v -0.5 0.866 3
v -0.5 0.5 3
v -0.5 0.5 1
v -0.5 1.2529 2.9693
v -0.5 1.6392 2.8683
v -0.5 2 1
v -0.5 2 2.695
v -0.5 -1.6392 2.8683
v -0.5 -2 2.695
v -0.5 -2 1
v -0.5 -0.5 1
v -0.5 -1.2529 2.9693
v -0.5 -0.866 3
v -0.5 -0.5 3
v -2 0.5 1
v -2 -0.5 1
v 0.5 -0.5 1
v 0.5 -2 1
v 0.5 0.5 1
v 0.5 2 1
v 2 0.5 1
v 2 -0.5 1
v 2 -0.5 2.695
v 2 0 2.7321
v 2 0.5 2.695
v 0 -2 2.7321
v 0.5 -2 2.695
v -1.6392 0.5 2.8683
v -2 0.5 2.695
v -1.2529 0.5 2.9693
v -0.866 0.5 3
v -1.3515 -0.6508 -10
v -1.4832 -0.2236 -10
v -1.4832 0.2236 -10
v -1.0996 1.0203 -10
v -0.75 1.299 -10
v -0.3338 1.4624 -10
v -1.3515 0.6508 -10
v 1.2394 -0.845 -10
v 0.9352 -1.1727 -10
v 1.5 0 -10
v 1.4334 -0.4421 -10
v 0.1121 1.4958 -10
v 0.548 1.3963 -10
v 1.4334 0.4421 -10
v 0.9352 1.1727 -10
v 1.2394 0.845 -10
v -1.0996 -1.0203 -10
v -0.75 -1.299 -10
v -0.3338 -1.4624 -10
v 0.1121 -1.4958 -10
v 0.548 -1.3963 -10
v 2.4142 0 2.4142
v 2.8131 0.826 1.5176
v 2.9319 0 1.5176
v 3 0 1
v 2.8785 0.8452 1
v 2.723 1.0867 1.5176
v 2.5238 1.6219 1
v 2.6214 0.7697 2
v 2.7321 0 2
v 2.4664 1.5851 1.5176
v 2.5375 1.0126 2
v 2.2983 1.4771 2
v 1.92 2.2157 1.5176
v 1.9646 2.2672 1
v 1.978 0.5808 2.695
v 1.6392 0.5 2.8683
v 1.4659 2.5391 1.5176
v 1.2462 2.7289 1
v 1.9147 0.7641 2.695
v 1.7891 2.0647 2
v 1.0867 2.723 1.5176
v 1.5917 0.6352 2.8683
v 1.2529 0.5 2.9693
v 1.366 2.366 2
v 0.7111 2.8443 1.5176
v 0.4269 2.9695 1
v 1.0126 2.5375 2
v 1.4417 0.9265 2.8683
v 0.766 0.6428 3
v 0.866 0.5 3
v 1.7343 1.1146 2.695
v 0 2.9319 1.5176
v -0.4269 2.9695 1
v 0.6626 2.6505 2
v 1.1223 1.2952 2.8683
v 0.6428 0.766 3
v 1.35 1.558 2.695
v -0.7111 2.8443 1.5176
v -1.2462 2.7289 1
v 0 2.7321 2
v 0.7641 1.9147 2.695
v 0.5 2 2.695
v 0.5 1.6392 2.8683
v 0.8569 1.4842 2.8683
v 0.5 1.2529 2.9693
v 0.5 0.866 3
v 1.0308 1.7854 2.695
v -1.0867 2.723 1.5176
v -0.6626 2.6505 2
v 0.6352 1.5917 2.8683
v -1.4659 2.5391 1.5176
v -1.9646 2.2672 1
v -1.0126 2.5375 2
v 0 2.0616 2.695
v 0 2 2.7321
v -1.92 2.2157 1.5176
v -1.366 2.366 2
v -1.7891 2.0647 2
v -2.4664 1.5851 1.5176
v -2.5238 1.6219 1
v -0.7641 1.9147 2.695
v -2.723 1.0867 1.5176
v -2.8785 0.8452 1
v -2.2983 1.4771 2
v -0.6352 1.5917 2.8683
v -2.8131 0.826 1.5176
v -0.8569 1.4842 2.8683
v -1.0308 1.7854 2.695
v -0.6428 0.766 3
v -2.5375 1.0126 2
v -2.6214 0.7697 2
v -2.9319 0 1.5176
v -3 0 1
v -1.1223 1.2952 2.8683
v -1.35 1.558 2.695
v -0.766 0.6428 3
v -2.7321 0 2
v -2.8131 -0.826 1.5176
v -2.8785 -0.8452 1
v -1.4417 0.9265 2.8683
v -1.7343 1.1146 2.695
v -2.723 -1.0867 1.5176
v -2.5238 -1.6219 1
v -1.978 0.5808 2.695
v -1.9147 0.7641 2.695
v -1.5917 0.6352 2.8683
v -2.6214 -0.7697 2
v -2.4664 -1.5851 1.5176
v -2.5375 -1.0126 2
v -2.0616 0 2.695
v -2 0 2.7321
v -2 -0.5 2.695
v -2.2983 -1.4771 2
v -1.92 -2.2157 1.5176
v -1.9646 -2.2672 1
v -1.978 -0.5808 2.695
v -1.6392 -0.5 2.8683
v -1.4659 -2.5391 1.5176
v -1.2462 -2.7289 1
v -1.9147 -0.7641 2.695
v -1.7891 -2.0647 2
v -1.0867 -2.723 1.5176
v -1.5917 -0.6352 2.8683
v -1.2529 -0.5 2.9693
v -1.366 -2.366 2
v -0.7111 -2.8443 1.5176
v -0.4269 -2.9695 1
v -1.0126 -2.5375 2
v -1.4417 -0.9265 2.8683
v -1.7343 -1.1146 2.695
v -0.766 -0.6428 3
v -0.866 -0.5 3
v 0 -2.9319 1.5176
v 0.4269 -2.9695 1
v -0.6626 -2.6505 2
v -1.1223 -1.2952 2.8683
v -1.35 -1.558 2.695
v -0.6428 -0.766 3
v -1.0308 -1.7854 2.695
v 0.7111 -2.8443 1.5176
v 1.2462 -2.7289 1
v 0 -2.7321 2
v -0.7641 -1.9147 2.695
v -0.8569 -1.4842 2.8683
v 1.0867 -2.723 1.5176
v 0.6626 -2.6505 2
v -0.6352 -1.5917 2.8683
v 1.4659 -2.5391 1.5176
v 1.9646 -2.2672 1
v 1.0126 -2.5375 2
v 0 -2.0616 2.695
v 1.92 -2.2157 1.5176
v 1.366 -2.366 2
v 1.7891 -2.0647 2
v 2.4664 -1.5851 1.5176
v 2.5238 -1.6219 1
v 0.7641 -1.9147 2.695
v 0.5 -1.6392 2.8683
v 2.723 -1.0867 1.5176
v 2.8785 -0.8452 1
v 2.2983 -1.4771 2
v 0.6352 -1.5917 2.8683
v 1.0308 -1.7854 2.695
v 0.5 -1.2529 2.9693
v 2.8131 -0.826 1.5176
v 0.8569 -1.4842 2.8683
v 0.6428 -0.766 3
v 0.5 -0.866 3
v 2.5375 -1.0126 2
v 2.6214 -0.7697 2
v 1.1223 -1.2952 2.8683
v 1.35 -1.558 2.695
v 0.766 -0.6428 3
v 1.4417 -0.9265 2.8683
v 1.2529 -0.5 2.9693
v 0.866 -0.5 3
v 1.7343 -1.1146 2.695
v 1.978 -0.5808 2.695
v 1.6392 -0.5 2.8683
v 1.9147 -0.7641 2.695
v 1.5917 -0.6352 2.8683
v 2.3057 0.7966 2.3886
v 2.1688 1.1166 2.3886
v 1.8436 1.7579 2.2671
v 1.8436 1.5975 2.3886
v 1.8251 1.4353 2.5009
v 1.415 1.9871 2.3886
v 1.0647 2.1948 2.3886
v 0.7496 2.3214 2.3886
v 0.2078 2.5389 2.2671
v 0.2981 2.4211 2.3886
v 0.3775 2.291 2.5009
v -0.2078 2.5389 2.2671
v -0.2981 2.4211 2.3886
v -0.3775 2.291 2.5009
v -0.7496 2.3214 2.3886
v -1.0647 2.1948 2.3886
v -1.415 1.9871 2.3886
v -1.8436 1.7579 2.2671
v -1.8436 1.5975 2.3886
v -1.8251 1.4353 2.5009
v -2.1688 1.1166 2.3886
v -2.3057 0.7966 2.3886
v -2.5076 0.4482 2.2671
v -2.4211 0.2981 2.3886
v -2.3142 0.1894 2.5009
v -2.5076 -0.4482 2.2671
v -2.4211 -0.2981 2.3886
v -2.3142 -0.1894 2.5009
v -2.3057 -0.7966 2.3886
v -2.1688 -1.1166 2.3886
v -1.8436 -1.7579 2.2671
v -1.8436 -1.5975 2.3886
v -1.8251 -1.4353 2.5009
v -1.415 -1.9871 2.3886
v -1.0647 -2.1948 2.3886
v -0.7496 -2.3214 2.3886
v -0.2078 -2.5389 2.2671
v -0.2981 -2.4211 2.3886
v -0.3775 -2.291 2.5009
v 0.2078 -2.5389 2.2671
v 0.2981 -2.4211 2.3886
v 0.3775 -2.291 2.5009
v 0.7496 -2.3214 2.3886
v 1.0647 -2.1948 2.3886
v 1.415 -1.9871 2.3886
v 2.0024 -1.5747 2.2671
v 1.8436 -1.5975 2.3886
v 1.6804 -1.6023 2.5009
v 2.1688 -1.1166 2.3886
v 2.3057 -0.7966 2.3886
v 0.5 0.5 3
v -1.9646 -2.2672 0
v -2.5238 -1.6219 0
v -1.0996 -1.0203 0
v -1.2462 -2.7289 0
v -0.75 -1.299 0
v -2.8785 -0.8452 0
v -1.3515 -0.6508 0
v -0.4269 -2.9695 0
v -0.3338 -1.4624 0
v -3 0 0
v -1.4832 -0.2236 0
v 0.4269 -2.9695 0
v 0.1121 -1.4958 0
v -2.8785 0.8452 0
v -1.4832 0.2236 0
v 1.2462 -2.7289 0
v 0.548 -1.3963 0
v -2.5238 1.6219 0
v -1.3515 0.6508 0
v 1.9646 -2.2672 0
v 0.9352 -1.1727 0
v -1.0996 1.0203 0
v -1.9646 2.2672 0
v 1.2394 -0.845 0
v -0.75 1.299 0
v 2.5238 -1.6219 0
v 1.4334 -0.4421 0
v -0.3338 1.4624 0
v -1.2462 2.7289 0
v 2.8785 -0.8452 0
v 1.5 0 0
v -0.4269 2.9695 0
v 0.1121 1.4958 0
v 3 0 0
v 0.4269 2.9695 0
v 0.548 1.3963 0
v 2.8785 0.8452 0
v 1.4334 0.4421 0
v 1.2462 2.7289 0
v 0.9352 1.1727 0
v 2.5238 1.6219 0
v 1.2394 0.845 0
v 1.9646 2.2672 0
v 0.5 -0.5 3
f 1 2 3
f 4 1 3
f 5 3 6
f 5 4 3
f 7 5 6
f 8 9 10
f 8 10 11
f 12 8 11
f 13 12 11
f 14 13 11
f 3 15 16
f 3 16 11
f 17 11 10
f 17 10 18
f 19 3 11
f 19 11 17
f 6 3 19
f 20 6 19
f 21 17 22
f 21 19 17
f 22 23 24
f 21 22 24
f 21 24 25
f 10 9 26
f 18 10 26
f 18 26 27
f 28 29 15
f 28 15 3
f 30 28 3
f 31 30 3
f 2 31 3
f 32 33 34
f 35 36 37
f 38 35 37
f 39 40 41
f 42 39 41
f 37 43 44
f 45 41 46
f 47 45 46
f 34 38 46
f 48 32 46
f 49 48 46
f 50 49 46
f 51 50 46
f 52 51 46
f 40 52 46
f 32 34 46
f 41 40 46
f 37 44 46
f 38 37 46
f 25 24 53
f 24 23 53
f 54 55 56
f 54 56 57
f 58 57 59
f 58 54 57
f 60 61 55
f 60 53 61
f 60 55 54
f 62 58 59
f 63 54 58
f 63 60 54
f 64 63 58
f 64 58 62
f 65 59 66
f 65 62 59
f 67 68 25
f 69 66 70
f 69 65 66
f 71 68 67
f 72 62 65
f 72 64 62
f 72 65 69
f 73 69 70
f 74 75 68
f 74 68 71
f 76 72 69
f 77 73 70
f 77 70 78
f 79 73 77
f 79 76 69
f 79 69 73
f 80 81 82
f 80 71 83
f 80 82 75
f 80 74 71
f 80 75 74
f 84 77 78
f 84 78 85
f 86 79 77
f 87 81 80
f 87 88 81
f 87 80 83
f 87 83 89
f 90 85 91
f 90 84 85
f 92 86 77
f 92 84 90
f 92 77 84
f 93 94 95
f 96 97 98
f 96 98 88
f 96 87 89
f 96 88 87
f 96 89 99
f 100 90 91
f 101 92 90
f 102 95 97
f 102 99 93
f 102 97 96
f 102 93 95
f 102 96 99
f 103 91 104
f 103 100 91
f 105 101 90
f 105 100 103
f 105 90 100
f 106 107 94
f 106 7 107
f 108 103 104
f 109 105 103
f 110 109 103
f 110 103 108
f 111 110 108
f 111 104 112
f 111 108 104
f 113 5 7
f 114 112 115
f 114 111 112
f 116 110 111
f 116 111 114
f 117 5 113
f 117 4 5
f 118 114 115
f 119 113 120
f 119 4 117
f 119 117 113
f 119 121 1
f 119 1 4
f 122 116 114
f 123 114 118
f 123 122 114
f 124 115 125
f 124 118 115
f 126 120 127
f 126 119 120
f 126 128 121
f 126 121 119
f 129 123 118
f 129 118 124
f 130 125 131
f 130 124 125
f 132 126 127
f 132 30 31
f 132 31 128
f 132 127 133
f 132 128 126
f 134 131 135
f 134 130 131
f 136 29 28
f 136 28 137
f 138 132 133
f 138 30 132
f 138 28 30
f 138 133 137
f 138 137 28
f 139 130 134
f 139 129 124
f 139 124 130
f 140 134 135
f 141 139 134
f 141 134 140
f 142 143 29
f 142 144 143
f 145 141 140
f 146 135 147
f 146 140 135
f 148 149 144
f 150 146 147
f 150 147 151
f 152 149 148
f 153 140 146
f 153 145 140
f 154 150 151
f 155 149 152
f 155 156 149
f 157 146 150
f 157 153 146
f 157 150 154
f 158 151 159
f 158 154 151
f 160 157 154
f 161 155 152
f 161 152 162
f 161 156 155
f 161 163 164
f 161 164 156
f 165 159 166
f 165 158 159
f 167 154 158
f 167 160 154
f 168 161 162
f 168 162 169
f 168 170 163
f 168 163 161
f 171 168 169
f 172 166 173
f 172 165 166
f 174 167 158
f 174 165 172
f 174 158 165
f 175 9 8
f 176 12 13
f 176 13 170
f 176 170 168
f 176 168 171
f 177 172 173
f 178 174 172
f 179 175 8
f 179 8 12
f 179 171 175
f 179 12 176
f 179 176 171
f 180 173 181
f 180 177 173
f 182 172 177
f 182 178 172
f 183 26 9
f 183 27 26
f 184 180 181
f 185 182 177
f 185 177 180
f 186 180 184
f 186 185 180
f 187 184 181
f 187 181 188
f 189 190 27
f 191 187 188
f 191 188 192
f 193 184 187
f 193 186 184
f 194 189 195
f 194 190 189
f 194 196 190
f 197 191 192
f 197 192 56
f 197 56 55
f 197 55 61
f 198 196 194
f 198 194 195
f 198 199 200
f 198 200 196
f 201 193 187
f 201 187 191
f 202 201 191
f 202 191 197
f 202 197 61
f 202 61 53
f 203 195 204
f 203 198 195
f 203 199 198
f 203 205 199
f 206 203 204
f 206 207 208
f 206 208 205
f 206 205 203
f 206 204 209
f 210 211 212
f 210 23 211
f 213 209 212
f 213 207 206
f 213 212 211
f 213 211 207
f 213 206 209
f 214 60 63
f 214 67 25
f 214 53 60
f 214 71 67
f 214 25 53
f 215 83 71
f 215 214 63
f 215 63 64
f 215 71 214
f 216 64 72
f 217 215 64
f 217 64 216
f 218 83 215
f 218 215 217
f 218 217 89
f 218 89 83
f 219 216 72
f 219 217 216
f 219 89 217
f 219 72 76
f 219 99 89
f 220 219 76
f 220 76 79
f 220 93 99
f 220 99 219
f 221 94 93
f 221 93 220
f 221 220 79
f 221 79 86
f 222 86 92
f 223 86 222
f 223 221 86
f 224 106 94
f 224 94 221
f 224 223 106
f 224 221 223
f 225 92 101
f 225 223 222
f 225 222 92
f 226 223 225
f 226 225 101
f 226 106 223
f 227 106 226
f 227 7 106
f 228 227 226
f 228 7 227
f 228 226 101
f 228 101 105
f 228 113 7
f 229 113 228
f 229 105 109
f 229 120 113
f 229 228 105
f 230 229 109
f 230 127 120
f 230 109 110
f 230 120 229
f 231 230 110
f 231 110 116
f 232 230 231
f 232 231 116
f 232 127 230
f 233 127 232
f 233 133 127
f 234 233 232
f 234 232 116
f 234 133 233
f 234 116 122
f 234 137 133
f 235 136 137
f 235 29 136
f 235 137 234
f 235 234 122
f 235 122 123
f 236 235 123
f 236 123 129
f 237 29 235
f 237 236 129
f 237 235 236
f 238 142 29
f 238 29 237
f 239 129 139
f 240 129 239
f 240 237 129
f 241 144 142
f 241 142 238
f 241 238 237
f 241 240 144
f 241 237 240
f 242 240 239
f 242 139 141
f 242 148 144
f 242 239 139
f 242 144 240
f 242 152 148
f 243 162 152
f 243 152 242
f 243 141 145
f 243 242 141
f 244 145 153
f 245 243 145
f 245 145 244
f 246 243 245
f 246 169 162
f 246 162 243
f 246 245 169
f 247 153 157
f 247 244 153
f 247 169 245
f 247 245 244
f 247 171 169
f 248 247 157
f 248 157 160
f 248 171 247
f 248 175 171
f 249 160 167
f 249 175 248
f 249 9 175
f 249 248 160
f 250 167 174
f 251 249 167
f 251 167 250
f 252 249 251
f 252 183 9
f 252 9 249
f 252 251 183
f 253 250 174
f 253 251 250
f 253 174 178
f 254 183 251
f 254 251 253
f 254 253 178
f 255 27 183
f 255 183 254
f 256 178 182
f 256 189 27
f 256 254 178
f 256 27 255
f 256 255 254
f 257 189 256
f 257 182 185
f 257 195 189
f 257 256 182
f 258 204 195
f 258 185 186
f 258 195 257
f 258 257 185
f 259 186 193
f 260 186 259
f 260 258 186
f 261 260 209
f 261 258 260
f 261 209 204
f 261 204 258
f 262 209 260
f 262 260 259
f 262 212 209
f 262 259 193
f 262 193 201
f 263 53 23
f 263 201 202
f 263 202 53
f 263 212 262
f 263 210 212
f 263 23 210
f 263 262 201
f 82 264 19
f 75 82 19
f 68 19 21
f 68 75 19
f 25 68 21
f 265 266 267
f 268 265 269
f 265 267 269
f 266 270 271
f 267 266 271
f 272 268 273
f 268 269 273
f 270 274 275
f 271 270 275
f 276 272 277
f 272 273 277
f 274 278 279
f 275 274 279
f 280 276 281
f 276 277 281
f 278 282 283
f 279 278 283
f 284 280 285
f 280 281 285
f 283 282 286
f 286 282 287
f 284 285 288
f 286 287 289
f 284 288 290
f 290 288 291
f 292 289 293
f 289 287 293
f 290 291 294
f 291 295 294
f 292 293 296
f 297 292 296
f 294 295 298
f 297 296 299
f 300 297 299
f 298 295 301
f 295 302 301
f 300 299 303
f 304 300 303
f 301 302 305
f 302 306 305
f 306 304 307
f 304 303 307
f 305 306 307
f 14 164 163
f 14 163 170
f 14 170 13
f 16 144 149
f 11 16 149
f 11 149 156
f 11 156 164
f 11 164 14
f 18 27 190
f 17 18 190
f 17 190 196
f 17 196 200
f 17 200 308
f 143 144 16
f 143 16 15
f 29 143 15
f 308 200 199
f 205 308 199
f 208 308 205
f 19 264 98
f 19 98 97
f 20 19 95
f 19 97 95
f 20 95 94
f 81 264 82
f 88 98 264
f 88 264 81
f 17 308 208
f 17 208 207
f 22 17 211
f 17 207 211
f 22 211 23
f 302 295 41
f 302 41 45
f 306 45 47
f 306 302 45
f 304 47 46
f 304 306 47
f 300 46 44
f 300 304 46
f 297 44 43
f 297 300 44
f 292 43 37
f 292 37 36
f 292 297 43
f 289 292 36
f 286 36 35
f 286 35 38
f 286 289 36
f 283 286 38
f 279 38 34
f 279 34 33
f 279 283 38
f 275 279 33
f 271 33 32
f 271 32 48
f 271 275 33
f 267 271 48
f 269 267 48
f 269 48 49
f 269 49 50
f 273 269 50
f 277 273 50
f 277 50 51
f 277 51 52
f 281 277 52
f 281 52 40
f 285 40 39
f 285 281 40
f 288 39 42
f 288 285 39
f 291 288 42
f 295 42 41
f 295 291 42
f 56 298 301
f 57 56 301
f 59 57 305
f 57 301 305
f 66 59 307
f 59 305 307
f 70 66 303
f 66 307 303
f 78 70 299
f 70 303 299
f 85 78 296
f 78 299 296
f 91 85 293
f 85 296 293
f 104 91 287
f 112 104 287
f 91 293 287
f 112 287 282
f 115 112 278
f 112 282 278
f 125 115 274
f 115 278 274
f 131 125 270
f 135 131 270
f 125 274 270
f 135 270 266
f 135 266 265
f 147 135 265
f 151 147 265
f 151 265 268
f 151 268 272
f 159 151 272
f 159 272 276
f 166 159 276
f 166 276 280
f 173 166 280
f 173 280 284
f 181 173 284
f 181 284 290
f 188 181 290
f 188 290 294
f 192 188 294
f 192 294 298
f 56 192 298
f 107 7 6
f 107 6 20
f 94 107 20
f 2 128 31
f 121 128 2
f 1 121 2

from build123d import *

# Parameters (mm, degrees)
F0_R     = 1.5
F1_DEPTH = 10
F2_R     = 3
F2_R_2   = 1.5
F3_DEPTH = 3
F4_W     = 1.5
F4_H     = 1
F4_W_2   = 1
F4_H_2   = 1.5
F5_DEPTH = 2


# Not quite as in the source:
# - a fillet or chamfer that OpenCascade refuses, or shapes differently, is made with other operations: its cross-section is extruded or revolved along the edge and cut away or added


with BuildPart() as f1:
    # F0 (on Top) → F1 (new body)
    with BuildSketch(Plane.XY):
        Circle(F0_R)
    extrude(amount=-F1_DEPTH)

    # F2 (on face) → F3 (join)
    with BuildSketch(Plane.XY):
        Circle(F2_R)
        Circle(F2_R_2, mode=Mode.SUBTRACT)
        Circle(F2_R_2)
    extrude(amount=F3_DEPTH)

    # F4 (on face) → F5 (cut)
    with BuildSketch(Plane.XY.offset(3)):
        with Locations((-1.25, 0)):
            Rectangle(F4_W, F4_H)
        with Locations((0, 1.25)):
            Rectangle(F4_W_2, F4_H_2)
        Rectangle(F4_W_2, F4_H)
        with Locations((1.25, 0)):
            Rectangle(F4_W, F4_H)
        with Locations((0, -1.25)):
            Rectangle(F4_W_2, F4_H_2)
    extrude(amount=-F5_DEPTH, mode=Mode.SUBTRACT)

    # F6: fillet of radius 2 on 1 edges, made by hand

    # F6_s1 → F6_t2 (revolve, cut)
    with BuildSketch(Plane.XZ):
        with BuildLine():
            ThreePointArc((3, 1), (2.4142135624, 2.4142135624), (1, 3))
            Line((1, 3), (3, 3))
            Line((3, 3), (3, 1))
        make_face()
    revolve(axis=Axis((0, 0, 3), (0, 0, 1)), mode=Mode.SUBTRACT)


solid = f1.part
